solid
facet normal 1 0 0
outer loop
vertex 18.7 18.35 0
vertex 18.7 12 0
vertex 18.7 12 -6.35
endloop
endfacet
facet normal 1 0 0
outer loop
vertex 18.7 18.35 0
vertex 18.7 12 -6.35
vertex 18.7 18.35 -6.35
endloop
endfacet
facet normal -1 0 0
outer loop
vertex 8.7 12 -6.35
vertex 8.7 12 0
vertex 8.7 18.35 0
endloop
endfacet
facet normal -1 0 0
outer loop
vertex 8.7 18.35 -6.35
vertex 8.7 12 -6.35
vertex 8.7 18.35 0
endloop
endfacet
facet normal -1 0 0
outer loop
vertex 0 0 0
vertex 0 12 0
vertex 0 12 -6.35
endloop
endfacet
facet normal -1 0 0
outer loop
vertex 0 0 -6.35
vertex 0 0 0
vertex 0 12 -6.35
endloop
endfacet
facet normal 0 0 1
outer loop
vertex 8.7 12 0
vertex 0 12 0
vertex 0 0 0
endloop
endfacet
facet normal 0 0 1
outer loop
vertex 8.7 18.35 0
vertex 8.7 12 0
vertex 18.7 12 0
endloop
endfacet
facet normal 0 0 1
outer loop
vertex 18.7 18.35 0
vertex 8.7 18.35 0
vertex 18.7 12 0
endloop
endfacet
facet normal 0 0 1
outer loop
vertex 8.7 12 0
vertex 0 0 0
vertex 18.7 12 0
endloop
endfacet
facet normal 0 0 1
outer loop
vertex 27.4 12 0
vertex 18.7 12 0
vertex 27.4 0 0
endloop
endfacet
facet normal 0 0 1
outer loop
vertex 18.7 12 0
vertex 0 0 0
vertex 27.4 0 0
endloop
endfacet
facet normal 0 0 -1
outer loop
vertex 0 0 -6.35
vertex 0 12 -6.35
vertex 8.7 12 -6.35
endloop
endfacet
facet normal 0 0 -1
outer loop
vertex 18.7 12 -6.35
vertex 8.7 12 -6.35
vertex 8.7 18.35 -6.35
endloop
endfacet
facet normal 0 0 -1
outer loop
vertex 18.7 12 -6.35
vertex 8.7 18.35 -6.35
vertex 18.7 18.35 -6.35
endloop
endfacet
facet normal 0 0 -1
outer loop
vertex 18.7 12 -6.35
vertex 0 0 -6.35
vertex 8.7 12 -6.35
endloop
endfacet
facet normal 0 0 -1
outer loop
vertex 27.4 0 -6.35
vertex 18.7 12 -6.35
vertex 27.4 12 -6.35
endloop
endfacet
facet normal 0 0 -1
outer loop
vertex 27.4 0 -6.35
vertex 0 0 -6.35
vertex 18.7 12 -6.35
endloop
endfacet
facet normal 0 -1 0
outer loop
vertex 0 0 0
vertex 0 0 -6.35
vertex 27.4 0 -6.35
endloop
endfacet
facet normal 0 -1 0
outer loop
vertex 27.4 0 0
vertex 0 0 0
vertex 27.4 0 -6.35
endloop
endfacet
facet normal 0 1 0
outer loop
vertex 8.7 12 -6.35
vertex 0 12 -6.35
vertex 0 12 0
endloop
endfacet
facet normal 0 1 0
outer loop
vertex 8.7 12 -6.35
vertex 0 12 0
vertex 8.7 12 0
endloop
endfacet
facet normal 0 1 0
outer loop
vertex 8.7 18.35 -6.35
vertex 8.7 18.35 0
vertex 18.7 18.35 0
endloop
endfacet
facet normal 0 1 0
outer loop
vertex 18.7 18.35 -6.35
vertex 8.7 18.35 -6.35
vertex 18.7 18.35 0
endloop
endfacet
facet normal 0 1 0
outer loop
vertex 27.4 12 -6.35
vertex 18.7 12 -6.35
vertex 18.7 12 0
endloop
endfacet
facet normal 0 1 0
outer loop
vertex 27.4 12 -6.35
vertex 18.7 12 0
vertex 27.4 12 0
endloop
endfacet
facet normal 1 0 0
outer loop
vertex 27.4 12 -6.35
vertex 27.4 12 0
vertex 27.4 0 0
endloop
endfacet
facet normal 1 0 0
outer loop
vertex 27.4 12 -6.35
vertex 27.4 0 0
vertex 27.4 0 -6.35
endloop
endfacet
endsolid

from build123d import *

# Parameters (mm, degrees)
SKETCH1_W           = 27.4
SKETCH1_H           = 6.35
BOSS_EXTRUDE1_DEPTH = 12
SKETCH2_W           = 10
SKETCH2_H           = 6.35
BOSS_EXTRUDE2_DEPTH = 6.35


with BuildPart() as part:
    # Sketch1 → Boss-Extrude1 (new body)
    with BuildSketch(Plane(origin=(0, 0, 0), x_dir=(1, 0, 0), z_dir=(0, 1, 0))):
        with Locations((13.7, 3.175)):
            Rectangle(SKETCH1_W, SKETCH1_H)
    extrude(amount=BOSS_EXTRUDE1_DEPTH)

    # Sketch2 → Boss-Extrude2 (add)
    with BuildSketch(Plane.XY):
        with Locations((13.7, 15.175)):
            Rectangle(SKETCH2_W, SKETCH2_H)
    extrude(amount=-BOSS_EXTRUDE2_DEPTH)


solid = part.part
